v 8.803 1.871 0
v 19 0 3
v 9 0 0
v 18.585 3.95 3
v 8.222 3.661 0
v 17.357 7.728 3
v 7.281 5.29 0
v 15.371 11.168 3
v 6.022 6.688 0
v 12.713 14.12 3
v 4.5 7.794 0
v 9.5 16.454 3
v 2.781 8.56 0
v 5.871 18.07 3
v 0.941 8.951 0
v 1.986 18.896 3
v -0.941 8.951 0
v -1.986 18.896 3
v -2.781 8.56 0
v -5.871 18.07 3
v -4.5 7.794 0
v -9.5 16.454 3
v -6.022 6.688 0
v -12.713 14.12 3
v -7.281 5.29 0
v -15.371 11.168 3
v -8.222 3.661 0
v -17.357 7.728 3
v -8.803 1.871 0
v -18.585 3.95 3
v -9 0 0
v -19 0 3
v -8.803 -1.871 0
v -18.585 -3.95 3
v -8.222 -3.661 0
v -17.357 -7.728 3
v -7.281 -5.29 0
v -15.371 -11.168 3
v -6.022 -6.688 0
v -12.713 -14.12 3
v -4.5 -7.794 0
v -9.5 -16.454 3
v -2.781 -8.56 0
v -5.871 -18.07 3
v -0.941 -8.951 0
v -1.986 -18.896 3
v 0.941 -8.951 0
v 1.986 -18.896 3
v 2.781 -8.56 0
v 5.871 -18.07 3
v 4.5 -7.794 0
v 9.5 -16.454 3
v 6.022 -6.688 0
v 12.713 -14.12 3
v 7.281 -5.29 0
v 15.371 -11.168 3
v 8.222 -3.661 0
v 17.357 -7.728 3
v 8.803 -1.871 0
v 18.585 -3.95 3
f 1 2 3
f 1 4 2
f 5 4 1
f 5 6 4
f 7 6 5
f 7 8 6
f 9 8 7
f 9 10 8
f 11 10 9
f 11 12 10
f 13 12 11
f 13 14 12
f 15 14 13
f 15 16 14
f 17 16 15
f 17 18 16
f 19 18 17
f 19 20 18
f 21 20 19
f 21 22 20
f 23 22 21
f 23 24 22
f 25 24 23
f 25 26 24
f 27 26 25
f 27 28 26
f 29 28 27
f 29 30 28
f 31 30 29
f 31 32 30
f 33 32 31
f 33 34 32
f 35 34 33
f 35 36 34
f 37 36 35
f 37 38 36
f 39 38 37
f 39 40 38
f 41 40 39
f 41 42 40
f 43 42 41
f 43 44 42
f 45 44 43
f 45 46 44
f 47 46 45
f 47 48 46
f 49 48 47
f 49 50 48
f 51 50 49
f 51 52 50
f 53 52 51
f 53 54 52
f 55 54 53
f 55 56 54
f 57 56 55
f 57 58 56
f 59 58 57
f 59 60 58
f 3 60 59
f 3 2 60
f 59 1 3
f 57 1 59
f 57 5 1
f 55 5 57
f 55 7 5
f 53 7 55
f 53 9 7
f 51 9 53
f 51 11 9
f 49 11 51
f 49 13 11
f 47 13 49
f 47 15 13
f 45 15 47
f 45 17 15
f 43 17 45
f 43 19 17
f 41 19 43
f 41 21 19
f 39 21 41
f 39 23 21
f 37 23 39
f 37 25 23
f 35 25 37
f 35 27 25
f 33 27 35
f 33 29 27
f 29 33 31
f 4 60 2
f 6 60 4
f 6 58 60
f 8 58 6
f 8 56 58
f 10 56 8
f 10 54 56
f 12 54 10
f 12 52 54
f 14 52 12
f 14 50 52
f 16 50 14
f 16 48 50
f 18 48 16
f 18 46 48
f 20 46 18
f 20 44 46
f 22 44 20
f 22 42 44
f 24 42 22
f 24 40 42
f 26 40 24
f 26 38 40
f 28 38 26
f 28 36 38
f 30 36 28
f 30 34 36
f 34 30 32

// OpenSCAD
// Generated by SolidPython 1.0.1 on 2020-07-29 00:02:42


cylinder(h = 3, r1 = 9, r2 = 19);
/***********************************************
*********      SolidPython code:      **********
************************************************
 
# import packages: SolidPython
from solid import *
from solid.utils import *
from itertools import chain, combinations


class Resize:

    def __init__(self, scad_file):
        self.scad_file = scad_file
        #self.scad_file = import_scad(scad_file)
        # cone/cylinder param:
        self.r1 = 0
        self.r2 = 0
        self.h = 0
        # rectangular prism param:
        self.w = 0
        self.l = 0
        # ellipse param:
        self.r = 0

    # import OpenScad code (file name corresponds to shape)


    # classify shape + parameters
    def assign(self, param1, param2, param3):
        if self.scad_file == 'cone.scad':
            self.r1 = param1
            self.r2 = param2
            self.h = param3
        elif self.scad_file == 'cylinder.scad':
            self.r1 = param1
            self.r2 = param2
            self.h = param3
        elif self.scad_file == 'rectangularPrism.scad':
            self.h = param1
            self.l = param2
            self.w = param3
        else:
            self.r = param1
            self.h = param2

    # resize parameters
    def iterate(self):
        x = range(3, 20, 2)
        i = 1
        if self.scad_file == 'cone.scad':
            tempList = list(combinations(x, 3))
            #print(tempList)
            for i in x:
                for j in range (3):
                    param1 = tempList[i][0]
                    param2 = tempList[i][1]
                    param3 = tempList[i][2]
                    filepath = 'produced_scad_files/' + 'cone' + str(param1) + '_' + str(param2) + '_' + str(param3) + '.scad'
                    scad_render_to_file(cylinder(h=param1, r1=param2, r2=param3), filepath)

        elif self.scad_file == 'cylinder.scad':
            tempList = list(combinations(x, 3))
            for i in x:
                for j in range(3):
                    param1 = tempList[i][0]
                    param2 = tempList[i][1]
                    param3 = tempList[i][2]
                    filepath = 'produced_scad_files/' + 'cylinder' + str(param1) + '_' + str(param2) + '_' + str(param3) + '.scad'
                    scad_render_to_file(cylinder(h=param1, r1=param2, r2=param3), filepath)

        elif self.scad_file == 'rectangularPrism.scad':
            tempList = list(combinations(x, 3))
            for i in x:
                for j in range(3):
                    param1 = tempList[i][0]
                    param2 = tempList[i][1]
                    param3 = tempList[i][2]
                    filepath = 'produced_scad_files/' + 'rectangularPrism' + str(param1) + '_' + str(param2) + '_' + str(
                        param3) + '.scad'
                    scad_render_to_file(cube(size=(param1, param2, param3)), filepath)

        else:
            tempList = list(combinations(x, 2))
            for i in x:
                for j in range(3):
                    param1 = tempList[i][0]
                    param2 = tempList[i][1]
                    filepath = 'produced_scad_files/' + 'ellipse' + str(param1) + '_' + str(param2) + '_' + '.scad'
                    scad_render_to_file(sphere(param1, param2), filepath)

    def render_to_scadfile(self):
        scad_render_to_file(scad, 'example.scad') 
 
************************************************/
